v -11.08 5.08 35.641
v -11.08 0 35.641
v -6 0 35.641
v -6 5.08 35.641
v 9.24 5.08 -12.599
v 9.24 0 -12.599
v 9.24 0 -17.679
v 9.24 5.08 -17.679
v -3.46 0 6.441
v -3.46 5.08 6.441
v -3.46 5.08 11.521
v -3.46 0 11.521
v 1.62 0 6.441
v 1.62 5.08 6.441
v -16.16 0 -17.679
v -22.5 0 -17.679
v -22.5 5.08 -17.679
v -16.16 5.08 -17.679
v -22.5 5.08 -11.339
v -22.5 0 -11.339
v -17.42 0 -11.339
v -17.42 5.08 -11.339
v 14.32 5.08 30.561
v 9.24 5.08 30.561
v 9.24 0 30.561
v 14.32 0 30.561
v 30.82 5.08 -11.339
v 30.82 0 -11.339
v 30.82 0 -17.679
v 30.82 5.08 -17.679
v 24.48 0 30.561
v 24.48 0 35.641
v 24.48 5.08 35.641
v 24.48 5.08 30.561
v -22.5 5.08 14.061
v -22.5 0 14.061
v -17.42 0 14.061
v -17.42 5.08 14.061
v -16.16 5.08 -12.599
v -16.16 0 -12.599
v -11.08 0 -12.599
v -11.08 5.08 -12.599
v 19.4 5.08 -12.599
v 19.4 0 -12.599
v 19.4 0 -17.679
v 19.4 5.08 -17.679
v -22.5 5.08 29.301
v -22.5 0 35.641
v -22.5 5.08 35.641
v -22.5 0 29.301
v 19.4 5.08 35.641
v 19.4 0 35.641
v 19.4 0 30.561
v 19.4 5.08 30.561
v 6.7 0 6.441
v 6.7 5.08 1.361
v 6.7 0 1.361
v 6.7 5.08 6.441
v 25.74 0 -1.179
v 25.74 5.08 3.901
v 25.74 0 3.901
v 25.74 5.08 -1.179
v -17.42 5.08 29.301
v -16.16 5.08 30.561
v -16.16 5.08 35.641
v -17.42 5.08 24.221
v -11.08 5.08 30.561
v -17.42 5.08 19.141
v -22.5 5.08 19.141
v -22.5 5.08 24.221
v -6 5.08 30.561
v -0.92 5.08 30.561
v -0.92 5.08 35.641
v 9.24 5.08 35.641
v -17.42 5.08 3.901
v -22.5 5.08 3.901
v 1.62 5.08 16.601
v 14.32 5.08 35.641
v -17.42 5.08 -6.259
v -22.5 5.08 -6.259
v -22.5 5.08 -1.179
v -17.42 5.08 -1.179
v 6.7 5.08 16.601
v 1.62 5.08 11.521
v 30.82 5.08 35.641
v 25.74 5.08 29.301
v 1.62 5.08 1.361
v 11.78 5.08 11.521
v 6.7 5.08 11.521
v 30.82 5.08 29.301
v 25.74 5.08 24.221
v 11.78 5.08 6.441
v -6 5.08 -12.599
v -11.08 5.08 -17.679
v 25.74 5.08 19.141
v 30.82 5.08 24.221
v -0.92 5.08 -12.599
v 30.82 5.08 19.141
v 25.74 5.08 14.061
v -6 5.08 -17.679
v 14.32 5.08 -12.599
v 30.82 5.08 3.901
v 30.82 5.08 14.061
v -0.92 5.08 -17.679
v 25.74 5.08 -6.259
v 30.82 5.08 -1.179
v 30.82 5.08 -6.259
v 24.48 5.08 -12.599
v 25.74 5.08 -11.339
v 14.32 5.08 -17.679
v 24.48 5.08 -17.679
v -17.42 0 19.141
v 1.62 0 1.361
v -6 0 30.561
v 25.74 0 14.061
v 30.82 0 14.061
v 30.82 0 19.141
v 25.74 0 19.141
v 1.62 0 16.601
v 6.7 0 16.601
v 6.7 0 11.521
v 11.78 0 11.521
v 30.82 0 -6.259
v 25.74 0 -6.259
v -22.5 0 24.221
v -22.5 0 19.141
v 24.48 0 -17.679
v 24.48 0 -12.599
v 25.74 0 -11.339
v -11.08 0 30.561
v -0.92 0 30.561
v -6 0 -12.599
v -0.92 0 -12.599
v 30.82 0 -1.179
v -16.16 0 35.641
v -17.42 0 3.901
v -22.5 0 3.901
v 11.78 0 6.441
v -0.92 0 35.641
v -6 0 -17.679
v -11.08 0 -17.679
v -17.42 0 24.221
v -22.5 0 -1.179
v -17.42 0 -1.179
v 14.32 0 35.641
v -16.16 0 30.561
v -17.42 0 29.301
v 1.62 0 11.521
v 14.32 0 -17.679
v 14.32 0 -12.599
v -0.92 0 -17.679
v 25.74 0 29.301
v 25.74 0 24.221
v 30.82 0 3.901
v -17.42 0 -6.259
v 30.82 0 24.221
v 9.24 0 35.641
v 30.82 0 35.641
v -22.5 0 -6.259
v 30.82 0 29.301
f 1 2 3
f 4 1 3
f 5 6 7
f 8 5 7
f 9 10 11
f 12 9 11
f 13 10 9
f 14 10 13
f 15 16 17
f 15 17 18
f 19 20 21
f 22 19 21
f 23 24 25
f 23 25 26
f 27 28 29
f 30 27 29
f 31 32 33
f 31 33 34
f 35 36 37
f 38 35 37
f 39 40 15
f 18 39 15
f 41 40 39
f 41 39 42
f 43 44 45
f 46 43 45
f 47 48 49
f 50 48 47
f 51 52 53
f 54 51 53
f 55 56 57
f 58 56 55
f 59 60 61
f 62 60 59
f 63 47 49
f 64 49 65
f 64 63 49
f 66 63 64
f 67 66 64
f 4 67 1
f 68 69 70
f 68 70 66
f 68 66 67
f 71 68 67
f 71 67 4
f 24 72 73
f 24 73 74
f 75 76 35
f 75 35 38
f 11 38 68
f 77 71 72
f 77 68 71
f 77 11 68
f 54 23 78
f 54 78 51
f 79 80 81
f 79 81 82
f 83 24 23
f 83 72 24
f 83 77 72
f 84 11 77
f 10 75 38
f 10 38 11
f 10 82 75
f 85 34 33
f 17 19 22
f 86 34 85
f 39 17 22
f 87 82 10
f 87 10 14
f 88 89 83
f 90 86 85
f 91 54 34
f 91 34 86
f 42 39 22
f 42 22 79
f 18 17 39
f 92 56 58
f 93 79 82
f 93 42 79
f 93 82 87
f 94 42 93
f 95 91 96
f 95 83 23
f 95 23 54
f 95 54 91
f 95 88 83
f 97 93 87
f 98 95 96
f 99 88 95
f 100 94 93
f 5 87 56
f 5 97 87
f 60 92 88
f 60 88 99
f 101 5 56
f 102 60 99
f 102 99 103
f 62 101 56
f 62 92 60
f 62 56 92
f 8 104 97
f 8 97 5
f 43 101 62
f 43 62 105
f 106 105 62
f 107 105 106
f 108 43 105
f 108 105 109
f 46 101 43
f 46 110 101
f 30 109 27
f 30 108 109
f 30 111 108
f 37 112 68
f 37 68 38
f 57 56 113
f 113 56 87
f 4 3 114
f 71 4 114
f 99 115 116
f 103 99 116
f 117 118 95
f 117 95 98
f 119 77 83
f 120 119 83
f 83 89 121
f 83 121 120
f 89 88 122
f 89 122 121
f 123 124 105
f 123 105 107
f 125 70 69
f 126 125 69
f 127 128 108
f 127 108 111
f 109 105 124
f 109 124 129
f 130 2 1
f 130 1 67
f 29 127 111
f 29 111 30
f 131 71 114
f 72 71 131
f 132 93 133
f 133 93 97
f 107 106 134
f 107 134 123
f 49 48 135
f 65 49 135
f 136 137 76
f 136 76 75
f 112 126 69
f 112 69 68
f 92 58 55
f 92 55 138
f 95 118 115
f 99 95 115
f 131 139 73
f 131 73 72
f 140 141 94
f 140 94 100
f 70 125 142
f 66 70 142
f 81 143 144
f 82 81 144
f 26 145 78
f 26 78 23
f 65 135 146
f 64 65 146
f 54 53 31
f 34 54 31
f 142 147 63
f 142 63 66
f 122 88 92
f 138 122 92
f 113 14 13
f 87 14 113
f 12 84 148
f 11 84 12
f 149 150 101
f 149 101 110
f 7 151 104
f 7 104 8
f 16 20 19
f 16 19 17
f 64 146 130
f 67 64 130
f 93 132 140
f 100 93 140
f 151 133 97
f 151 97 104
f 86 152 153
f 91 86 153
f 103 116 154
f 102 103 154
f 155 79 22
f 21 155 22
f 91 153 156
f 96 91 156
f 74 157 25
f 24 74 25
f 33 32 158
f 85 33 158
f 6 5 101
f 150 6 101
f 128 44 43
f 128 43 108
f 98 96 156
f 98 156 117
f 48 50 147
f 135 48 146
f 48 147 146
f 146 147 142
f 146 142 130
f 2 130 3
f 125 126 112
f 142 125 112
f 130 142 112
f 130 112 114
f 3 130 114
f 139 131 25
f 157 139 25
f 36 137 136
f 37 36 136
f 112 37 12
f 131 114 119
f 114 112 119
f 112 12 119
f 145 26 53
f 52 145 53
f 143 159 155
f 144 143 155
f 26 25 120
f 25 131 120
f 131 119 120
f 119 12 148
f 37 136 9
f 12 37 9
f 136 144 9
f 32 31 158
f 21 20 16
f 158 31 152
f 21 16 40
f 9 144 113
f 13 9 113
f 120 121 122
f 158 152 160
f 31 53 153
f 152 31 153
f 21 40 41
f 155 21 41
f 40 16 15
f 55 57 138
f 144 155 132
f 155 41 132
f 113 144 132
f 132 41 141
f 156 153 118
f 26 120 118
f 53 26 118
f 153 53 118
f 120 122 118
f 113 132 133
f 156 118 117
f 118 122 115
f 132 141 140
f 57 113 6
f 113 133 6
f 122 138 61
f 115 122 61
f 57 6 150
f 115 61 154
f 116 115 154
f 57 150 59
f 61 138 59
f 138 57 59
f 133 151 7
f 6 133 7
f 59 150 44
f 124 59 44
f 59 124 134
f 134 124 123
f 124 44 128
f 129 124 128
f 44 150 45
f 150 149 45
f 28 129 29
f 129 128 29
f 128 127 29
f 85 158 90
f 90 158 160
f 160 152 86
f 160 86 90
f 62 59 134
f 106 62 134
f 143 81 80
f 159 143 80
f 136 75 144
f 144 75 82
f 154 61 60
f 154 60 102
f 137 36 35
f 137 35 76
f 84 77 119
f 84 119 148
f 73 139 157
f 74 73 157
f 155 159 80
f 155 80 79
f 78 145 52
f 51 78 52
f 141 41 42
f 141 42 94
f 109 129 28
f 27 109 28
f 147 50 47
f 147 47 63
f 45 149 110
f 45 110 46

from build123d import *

# Parameters (mm, degrees)
SKETCH1_W           = 53.32
SKETCH1_H           = 53.32
BOSS_EXTRUDE1_DEPTH = 5.08
SKETCH2_W           = 5.08
SKETCH2_H           = 5.08
CUT_EXTRUDE1_DEPTH  = 5.08
CUT_EXTRUDE2_DEPTH  = 5.08


with BuildPart() as part:
    # Sketch1 → Boss-Extrude1 (new body)
    with BuildSketch(Plane(origin=(0, 0, 0), x_dir=(1, 0, 0), z_dir=(0, 1, 0))):
        with Locations((4.159716312, -8.981205674)):
            Rectangle(SKETCH1_W, SKETCH1_H)
    extrude(amount=BOSS_EXTRUDE1_DEPTH)

    # Sketch2 → Cut-Extrude1 (cut)
    with BuildSketch(Plane(origin=(0, 5.08, 0), x_dir=(1, 0, 0), z_dir=(0, 1, 0))):
        with Locations((-13.620283688, -33.101205674)):
            Rectangle(SKETCH2_W, SKETCH2_H)
        with Locations((11.779716312, -33.101205674)):
            Rectangle(SKETCH2_W, SKETCH2_H)
        with Locations((21.939716312, -33.101205674)):
            Rectangle(SKETCH2_W, SKETCH2_H)
        with Locations((-3.460283688, -33.101205674)):
            Rectangle(SKETCH2_W, SKETCH2_H)
        with Locations((-19.960283688, 8.798794326)):
            Rectangle(SKETCH2_W, SKETCH2_H)
        with Locations((-19.960283688, -16.601205674)):
            Rectangle(SKETCH2_W, SKETCH2_H)
        with Locations((-19.960283688, -26.761205674)):
            Rectangle(SKETCH2_W, SKETCH2_H)
        with Locations((-19.960283688, -1.361205674)):
            Rectangle(SKETCH2_W, SKETCH2_H)
        with Locations((21.939716312, 15.138794326)):
            Rectangle(SKETCH2_W, SKETCH2_H)
        with Locations((-3.460283688, 15.138794326)):
            Rectangle(SKETCH2_W, SKETCH2_H)
        with Locations((-13.620283688, 15.138794326)):
            Rectangle(SKETCH2_W, SKETCH2_H)
        with Locations((11.779716312, 15.138794326)):
            Rectangle(SKETCH2_W, SKETCH2_H)
        with Locations((28.279716312, -26.761205674)):
            Rectangle(SKETCH2_W, SKETCH2_H)
        with Locations((28.279716312, -1.361205674)):
            Rectangle(SKETCH2_W, SKETCH2_H)
        with Locations((28.279716312, 8.798794326)):
            Rectangle(SKETCH2_W, SKETCH2_H)
        with Locations((28.279716312, -16.601205674)):
            Rectangle(SKETCH2_W, SKETCH2_H)
    extrude(amount=-CUT_EXTRUDE1_DEPTH, mode=Mode.SUBTRACT)

    # Sketch3 → Cut-Extrude2 (cut)
    with BuildSketch(Plane(origin=(0, 5.08, 0), x_dir=(1, 0, 0), z_dir=(0, 1, 0))):
        Polygon((4.159716312, -1.361205674), (6.699716312, -1.361205674), (6.699716312, -6.441205674), (11.779716312, -6.441205674), (11.779716312, -8.981205674), (11.779716312, -11.521205674), (6.699716312, -11.521205674), (6.699716312, -16.601205674), (4.159716312, -16.601205674), (1.619716312, -16.601205674), (1.619716312, -11.521205674), (-3.460283688, -11.521205674), (-3.460283688, -8.981205674), (-3.460283688, -6.441205674), (1.619716312, -6.441205674), (1.619716312, -1.361205674), align=None)
    extrude(amount=-CUT_EXTRUDE2_DEPTH, mode=Mode.SUBTRACT)


solid = part.part
